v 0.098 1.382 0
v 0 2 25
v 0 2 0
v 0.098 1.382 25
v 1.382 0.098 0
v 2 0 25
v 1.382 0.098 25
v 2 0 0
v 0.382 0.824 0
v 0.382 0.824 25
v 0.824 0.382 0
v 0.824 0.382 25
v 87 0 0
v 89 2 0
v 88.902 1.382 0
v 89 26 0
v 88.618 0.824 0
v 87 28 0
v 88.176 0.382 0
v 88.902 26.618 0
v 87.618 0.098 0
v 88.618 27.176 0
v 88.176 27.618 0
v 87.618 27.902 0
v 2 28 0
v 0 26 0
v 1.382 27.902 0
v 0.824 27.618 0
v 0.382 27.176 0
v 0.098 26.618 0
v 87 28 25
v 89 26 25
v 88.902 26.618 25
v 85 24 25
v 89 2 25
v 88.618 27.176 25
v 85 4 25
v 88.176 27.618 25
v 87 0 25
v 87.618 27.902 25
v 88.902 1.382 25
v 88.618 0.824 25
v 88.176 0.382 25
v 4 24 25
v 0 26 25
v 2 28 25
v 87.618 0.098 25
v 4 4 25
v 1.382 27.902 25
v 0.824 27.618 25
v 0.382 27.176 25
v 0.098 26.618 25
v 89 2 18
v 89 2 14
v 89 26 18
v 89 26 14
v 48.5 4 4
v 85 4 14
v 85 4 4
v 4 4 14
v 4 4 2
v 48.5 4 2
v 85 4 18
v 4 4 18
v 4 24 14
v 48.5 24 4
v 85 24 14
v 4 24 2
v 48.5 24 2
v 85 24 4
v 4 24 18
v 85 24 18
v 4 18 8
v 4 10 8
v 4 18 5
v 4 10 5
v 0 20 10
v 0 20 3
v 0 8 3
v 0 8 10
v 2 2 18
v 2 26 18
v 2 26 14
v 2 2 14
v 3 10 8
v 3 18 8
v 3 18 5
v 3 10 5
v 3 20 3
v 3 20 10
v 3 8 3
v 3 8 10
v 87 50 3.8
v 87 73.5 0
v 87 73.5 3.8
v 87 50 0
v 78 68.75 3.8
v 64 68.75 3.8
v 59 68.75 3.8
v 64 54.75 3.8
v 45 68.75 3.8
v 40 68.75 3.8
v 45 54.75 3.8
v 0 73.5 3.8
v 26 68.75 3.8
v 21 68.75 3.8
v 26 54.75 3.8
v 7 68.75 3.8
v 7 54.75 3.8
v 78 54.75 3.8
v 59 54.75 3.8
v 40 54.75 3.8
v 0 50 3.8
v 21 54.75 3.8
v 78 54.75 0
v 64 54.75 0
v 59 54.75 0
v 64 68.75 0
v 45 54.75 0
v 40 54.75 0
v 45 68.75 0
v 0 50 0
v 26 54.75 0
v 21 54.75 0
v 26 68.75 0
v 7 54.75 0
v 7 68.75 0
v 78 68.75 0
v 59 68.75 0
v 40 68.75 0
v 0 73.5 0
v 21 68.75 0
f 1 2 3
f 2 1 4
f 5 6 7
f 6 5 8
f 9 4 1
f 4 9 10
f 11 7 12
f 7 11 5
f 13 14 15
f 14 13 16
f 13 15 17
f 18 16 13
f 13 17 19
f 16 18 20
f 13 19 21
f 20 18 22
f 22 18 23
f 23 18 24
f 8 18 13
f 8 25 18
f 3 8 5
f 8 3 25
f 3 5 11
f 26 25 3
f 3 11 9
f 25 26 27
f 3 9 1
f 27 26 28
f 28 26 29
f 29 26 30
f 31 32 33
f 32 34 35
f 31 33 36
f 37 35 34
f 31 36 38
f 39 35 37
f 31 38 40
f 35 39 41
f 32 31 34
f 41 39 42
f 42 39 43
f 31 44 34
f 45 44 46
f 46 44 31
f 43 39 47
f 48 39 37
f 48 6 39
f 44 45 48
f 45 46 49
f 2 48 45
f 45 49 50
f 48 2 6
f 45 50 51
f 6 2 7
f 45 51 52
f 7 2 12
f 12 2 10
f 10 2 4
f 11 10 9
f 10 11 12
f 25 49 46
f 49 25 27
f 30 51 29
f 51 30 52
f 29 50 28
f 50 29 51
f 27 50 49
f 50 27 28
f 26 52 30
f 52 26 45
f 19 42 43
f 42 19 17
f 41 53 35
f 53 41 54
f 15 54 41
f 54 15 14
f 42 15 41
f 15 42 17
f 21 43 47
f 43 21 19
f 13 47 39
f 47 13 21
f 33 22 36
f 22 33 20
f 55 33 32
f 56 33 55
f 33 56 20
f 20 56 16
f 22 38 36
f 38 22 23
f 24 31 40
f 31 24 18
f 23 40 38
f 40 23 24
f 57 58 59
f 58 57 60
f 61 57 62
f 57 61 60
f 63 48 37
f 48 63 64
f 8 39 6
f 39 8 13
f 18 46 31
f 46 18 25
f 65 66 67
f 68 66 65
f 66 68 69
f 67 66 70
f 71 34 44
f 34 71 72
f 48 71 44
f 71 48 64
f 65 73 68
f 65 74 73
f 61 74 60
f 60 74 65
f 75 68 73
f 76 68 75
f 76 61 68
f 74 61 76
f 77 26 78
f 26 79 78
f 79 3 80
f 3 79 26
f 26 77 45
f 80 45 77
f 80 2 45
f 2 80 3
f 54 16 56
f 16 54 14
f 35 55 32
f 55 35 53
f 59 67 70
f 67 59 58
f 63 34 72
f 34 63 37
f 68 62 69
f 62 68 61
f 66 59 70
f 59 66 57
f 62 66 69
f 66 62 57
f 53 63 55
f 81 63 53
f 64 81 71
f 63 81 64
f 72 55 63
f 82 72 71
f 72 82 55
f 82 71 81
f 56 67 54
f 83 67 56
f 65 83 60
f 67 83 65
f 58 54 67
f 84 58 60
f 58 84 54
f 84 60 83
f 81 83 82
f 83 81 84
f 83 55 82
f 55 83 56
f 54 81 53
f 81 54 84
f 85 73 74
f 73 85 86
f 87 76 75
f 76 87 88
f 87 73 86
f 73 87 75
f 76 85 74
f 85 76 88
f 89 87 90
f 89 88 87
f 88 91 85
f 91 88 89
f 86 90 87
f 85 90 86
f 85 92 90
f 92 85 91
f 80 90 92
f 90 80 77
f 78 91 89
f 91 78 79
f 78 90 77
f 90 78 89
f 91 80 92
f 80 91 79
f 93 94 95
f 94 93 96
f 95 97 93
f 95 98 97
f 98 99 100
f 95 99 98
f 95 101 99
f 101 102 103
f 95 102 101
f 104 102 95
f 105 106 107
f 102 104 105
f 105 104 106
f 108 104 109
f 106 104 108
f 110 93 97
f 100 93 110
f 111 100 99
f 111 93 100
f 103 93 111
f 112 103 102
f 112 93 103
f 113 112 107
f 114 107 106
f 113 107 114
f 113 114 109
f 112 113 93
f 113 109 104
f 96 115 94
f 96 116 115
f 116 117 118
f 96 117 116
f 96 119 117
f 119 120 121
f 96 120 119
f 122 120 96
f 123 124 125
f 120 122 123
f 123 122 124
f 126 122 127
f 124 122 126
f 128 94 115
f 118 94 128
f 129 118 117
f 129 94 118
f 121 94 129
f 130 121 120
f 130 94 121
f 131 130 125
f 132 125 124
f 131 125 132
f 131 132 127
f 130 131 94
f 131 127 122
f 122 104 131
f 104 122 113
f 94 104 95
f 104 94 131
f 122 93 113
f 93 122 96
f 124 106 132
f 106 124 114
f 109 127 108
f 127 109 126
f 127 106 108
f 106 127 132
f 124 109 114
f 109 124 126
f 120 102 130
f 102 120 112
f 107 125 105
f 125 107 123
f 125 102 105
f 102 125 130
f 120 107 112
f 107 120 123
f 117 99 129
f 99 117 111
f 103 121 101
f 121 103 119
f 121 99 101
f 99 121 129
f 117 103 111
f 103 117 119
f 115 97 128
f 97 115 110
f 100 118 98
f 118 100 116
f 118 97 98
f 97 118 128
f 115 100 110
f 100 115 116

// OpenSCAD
borderHeight = 25;
sizeX = 85;
sizeY = 24;

details=20; //change to 100 for best render, lower for fast render

//translate([2,2,0])square([sizeX, sizeY]);

module walls(){
    //rounded corners
    translate([2,2,0])cylinder(borderHeight, 2, 2, $fn=details);
    translate([2,sizeY+2,0])cylinder(borderHeight, 2, 2, $fn=details);
    translate([sizeX+2,2,0])cylinder(borderHeight, 2, 2, $fn=details);
    translate([sizeX+2,sizeY+2,0])cylinder(borderHeight, 2, 2, $fn=details);

    //actual walls
    translate([2,0,0])cube([sizeX,4,borderHeight]);
    translate([0,sizeY,0])translate([2,0,0])cube([sizeX,4,borderHeight]);
    translate([0,2,0])cube([4,sizeY,borderHeight]);
    translate([sizeX,2,0])cube([4,sizeY,borderHeight]);
    
    //floor
    translate([2,2,0])cube([sizeX,sizeY,2]);
    //floor thickener
    translate([sizeX-sizeX/2+6,2,0])cube([sizeX/2-6,sizeY,4]); //+- 6mm compensates for the size of arudino, which is larger than sizeX/2
}

difference() {
    walls();
    translate([2,2,14])cube([sizeX+2,sizeY,4]);//plate slide-in hole
    
    //microUSB connector hole
    translate([0,10,5])cube([10,8,3]);
    #translate([0,8,3])cube([3,12,7]);
    
}
//#translate([78,-64,2])import("C:/Users/sch3f/Desktop/arduinoNanoModel.stl");

module switches() {
    difference(){
        cube([87,23.5,3.8]); //plate
        translate([7,4.75,0])cube([14,14,6]); //switch hole1
        translate([26,4.75,0])cube([14,14,6]); //switch hole2
        translate([45,4.75,0])cube([14,14,6]); //switch hole3
        translate([64,4.75,0])cube([14,14,6]); //switch hole4
    }
}

translate([0,50,0])switches();
